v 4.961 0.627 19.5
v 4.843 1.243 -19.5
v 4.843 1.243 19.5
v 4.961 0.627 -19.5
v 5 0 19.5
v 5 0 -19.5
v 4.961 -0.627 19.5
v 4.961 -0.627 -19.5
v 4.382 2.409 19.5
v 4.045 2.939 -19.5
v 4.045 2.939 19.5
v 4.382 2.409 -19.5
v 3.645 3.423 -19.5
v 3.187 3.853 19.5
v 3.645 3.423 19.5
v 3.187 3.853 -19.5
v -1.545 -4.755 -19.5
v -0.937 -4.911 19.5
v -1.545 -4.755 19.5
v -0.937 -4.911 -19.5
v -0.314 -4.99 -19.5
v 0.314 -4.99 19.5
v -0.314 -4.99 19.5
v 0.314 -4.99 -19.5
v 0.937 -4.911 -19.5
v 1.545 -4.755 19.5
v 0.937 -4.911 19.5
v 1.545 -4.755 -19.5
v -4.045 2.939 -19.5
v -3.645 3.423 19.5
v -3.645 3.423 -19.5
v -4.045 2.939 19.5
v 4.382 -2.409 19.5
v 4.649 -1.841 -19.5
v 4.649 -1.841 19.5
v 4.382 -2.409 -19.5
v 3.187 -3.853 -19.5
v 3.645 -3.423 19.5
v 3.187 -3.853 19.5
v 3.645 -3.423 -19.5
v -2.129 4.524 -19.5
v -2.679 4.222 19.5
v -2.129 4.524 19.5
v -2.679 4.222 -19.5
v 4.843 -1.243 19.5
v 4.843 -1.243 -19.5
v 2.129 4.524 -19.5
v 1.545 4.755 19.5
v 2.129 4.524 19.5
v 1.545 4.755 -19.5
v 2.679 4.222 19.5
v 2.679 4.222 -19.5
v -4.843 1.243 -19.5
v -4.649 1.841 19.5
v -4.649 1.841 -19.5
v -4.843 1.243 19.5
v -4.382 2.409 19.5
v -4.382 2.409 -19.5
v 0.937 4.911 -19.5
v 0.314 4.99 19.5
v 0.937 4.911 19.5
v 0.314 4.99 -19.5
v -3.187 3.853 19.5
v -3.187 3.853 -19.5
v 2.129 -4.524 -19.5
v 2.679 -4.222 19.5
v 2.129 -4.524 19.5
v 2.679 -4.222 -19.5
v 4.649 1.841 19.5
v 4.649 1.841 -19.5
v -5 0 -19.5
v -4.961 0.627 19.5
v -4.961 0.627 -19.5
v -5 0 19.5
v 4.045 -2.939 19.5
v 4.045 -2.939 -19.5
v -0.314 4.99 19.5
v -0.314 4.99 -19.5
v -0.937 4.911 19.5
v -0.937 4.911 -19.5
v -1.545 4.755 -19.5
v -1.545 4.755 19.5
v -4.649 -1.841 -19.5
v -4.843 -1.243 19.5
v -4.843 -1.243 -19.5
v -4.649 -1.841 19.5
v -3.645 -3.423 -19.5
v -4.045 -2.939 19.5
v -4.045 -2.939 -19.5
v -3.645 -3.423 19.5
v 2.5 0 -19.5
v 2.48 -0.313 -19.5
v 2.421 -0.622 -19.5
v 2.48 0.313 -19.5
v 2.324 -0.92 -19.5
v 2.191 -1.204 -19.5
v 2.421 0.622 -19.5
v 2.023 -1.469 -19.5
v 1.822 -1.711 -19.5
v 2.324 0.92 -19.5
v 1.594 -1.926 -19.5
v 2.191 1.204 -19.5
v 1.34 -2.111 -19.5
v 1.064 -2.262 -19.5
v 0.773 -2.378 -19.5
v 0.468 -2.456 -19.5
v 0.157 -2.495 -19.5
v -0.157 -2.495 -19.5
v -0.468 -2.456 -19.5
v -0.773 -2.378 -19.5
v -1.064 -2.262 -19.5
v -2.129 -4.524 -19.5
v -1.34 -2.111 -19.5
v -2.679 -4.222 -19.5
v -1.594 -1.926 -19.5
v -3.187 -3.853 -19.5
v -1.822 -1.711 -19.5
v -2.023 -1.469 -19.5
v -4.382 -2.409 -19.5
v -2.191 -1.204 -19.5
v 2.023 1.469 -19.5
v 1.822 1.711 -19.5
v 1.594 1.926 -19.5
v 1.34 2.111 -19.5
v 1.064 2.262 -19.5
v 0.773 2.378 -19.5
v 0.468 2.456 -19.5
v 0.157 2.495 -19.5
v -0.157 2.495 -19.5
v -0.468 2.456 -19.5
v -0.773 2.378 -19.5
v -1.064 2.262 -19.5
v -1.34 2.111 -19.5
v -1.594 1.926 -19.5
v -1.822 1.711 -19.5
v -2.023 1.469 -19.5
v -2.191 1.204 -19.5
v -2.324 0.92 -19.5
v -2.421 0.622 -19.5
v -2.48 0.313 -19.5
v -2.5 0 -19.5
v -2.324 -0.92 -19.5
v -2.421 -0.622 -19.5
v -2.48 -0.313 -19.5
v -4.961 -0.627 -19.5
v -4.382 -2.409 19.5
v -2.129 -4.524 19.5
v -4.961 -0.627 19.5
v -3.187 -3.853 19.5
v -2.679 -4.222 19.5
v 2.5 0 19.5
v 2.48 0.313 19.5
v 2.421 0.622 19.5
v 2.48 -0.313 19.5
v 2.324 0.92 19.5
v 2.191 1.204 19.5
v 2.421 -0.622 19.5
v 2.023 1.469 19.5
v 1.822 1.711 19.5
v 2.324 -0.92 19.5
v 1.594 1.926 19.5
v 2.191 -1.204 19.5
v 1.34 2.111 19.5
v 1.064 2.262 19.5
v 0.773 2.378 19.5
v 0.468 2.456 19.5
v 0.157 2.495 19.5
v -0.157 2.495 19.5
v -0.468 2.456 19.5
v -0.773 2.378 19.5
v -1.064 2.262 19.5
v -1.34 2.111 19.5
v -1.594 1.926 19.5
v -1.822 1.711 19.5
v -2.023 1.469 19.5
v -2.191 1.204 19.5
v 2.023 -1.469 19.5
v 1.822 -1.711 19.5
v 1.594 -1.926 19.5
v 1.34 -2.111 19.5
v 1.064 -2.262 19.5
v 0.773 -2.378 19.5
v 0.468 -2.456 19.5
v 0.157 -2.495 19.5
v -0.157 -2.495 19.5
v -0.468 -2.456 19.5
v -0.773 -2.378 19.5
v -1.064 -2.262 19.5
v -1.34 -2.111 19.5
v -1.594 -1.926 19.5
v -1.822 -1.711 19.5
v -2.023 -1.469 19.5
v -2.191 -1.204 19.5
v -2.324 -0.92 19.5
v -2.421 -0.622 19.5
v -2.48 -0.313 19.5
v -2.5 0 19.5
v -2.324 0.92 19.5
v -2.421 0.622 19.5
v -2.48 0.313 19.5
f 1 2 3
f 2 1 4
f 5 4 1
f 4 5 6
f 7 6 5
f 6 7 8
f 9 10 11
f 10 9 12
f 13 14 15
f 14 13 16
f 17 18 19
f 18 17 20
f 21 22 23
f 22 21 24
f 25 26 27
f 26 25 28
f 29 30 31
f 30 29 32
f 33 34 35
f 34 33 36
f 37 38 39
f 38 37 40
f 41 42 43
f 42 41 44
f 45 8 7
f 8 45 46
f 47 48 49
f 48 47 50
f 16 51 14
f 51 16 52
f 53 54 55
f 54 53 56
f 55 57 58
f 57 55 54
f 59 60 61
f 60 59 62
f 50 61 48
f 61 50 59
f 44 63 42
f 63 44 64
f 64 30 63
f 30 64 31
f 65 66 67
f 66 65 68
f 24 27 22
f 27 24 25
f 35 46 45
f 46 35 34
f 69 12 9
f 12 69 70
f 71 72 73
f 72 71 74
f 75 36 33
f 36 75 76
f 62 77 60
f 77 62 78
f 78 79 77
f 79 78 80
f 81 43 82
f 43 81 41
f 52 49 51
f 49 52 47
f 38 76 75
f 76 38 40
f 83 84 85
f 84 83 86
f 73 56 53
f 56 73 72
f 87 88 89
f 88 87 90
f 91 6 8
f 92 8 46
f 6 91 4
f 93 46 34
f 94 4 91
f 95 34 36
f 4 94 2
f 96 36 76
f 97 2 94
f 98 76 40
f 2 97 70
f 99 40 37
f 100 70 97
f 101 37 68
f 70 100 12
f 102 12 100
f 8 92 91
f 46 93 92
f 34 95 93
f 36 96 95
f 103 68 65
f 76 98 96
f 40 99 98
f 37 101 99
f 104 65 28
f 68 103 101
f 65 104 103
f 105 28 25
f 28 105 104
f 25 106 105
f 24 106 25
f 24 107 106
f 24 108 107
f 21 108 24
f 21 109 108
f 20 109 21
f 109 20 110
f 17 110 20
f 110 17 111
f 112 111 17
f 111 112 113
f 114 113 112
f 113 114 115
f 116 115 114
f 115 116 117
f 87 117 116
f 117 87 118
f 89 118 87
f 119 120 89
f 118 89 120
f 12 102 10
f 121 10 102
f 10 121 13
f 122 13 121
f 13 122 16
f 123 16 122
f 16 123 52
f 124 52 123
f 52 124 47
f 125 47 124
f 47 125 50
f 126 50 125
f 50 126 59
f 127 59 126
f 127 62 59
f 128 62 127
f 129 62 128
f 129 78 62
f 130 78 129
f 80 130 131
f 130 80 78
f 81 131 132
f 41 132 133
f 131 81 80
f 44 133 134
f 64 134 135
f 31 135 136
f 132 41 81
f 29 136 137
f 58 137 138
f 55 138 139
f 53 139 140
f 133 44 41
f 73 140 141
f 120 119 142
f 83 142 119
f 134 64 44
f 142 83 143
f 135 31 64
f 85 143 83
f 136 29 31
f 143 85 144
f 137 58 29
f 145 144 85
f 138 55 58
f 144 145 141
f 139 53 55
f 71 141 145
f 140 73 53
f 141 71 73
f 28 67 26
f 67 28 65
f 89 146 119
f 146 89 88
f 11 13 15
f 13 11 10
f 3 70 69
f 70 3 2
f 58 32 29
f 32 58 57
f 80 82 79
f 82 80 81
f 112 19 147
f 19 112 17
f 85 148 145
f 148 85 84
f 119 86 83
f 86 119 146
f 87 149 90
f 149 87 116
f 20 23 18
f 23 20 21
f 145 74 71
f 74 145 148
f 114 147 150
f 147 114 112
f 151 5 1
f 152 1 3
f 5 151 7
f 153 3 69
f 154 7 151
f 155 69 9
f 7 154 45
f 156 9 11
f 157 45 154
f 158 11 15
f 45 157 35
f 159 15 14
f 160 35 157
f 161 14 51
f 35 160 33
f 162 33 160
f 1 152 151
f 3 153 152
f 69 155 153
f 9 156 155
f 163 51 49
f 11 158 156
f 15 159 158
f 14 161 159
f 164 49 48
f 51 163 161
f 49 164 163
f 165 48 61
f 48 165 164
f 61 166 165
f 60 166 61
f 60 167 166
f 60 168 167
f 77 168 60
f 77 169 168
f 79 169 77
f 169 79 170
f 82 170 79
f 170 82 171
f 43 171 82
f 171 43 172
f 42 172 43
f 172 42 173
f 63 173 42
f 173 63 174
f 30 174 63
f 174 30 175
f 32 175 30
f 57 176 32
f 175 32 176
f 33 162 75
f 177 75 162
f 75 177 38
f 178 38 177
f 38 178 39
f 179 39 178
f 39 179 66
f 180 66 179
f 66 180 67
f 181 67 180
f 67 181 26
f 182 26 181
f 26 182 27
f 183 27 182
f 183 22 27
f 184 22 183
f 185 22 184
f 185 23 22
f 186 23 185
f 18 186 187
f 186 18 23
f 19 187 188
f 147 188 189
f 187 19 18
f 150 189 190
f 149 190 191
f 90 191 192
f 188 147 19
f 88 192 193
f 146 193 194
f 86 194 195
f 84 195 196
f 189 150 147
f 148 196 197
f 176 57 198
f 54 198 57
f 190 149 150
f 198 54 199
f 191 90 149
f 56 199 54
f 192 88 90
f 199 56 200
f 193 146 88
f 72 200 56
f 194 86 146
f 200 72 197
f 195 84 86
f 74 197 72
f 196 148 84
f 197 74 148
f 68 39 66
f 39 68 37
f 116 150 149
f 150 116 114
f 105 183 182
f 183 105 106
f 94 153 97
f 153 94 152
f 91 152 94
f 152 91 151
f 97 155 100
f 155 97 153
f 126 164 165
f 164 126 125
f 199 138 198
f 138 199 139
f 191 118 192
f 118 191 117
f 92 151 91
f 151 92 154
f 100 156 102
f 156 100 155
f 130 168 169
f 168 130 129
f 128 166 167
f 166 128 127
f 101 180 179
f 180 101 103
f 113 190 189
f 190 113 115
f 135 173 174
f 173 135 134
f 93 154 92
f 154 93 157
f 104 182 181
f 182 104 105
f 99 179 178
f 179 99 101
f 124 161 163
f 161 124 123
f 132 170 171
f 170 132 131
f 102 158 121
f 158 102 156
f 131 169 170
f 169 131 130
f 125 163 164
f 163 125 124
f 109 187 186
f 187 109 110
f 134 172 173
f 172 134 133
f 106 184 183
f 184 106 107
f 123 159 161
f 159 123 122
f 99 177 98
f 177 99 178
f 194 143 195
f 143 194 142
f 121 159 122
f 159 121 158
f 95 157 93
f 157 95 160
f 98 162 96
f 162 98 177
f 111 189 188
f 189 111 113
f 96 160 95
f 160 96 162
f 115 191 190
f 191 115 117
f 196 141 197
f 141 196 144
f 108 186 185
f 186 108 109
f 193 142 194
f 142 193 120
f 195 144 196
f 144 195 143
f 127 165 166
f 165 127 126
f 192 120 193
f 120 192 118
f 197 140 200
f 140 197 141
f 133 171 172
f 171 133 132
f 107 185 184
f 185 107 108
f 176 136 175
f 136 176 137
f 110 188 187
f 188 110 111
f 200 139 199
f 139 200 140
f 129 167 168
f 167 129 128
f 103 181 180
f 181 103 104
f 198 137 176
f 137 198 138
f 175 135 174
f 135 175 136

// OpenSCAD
$fn = 50;


difference() {
	union() {
		translate(v = [0, 0, -19.5000000000]) {
			cylinder(h = 39, r = 5.0000000000);
		}
	}
	union() {
		translate(v = [0, 0, -100.0000000000]) {
			cylinder(h = 200, r = 2.5000000000);
		}
	}
}
